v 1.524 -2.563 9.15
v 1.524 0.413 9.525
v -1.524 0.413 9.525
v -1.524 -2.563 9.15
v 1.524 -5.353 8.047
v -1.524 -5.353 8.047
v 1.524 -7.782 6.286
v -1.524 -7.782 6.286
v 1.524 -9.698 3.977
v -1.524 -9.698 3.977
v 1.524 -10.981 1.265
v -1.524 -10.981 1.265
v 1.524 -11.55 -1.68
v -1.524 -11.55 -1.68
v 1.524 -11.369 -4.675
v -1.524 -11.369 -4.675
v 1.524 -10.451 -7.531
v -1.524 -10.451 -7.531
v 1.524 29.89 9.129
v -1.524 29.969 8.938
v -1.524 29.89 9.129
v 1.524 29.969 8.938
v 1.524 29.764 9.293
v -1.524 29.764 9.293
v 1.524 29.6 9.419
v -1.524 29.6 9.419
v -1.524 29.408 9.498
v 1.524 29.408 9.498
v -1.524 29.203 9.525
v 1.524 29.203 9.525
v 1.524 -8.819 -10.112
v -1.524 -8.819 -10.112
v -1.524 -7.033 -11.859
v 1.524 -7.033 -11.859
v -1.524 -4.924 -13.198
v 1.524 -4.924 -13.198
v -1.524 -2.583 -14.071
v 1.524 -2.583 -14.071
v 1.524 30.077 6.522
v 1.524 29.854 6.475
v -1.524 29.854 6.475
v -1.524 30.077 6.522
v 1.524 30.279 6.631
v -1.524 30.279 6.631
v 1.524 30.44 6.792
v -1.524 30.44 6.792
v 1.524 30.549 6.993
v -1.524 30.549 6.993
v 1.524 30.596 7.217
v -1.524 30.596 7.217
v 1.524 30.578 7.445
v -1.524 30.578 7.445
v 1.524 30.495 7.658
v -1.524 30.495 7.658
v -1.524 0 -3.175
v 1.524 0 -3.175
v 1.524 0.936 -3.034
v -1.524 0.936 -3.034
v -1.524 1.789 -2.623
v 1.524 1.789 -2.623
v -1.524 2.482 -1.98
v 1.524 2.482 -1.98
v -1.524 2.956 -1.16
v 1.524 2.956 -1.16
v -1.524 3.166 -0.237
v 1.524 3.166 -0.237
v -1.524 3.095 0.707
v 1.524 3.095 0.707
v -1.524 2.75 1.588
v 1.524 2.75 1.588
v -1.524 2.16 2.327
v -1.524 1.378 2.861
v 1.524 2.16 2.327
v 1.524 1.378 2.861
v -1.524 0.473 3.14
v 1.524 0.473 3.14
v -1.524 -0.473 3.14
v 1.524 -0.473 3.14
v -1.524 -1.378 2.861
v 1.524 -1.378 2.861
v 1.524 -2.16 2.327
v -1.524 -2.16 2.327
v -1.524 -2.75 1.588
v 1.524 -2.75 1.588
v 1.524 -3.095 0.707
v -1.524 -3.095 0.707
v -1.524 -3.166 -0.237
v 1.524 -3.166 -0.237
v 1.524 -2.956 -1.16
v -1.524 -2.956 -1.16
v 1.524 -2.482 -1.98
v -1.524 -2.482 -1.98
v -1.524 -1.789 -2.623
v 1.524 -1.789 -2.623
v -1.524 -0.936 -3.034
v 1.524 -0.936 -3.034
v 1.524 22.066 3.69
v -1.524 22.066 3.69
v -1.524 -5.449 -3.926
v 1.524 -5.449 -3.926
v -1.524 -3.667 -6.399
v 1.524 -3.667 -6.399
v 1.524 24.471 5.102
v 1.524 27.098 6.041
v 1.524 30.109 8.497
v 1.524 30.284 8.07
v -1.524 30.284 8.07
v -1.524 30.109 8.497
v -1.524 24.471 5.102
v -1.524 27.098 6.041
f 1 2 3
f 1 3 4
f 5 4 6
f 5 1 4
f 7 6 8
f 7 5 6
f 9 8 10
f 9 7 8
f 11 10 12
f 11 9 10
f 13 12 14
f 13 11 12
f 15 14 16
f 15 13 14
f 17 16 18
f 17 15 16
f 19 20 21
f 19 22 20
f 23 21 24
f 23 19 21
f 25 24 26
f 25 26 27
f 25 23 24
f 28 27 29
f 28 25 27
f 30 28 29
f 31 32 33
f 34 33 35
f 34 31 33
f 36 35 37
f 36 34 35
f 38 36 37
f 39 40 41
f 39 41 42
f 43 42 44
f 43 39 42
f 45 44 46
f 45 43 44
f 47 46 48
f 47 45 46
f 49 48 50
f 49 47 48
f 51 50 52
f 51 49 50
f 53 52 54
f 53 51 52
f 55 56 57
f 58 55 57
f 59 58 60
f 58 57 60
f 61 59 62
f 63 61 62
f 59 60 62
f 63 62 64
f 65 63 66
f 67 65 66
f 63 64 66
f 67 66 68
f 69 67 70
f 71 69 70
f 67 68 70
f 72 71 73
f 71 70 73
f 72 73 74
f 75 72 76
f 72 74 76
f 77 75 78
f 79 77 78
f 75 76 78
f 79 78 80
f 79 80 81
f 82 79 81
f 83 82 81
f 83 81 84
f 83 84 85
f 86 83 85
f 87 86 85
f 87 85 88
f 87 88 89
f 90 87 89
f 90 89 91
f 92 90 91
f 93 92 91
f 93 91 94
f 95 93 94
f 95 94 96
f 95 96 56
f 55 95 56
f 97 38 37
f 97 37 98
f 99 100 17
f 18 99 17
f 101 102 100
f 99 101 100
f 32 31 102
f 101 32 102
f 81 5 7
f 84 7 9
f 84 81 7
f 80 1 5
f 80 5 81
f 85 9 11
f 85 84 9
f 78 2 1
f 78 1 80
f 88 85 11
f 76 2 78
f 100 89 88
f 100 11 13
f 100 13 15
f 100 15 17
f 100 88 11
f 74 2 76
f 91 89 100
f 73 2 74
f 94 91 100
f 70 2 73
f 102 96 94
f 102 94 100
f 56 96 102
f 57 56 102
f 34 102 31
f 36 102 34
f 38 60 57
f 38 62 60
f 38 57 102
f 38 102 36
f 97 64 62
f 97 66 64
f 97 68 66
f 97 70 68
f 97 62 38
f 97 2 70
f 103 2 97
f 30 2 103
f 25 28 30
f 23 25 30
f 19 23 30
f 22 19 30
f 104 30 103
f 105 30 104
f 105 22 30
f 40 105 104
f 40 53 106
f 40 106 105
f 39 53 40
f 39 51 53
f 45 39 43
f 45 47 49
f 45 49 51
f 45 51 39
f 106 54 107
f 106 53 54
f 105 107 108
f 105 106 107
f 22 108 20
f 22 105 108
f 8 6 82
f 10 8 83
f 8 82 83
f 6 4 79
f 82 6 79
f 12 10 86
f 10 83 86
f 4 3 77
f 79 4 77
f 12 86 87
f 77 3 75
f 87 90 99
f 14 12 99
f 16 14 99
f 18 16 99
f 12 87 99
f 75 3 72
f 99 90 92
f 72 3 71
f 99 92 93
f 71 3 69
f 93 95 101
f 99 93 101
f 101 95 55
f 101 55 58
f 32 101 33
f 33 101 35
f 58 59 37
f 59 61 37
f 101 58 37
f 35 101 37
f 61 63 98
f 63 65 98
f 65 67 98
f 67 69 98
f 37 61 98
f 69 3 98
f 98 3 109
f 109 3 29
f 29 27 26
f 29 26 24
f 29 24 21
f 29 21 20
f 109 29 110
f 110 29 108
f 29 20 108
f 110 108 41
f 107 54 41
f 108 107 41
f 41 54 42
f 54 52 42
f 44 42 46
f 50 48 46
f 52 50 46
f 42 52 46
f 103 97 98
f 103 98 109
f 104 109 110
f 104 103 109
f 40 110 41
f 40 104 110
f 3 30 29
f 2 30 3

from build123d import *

# Parameters (mm, degrees)
BOSS_EXTRUDE1_DEPTH = 1.524
SKETCH2_R           = 3.175
CUT_EXTRUDE1_DEPTH  = 4.048
CUT_EXTRUDE2_DEPTH  = 4.048


with BuildPart() as part:
    # Sketch1 → Boss-Extrude1 (new body, symmetric)
    with BuildSketch(Plane(origin=(0, 0, 0), x_dir=(0, 0, -1), z_dir=(1, 0, 0))):
        with BuildLine():
            Line((-9.525, 29.203153615), (-9.525, 0.413383537))
            ThreePointArc((-9.525, 0.413383537), (0.953114694, -11.479629163), (14.071488999, -2.58339995))
            Line((14.071488999, -2.58339995), (-3.690440969, 22.065775388))
            ThreePointArc((-3.690440969, 22.065775388), (-5.633424794, 25.762785311), (-6.474725684, 29.85366313))
            ThreePointArc((-6.474725684, 29.85366313), (-6.888835567, 30.502157859), (-7.658237218, 30.494842983))
            ThreePointArc((-7.658237218, 30.494842983), (-8.281558069, 30.191808808), (-8.938016281, 29.969499991))
            ThreePointArc((-8.938016281, 29.969499991), (-9.361392761, 29.685812049), (-9.525, 29.203153615))
        make_face()
    extrude(amount=BOSS_EXTRUDE1_DEPTH, both=True)

    # Sketch2 → Cut-Extrude1 (cut, through all)
    with BuildSketch(Plane(origin=(1.524, 0, 0), x_dir=(0, 0, -1), z_dir=(1, 0, 0))):
        Circle(SKETCH2_R)
    extrude(amount=-CUT_EXTRUDE1_DEPTH, mode=Mode.SUBTRACT)

    # Sketch3 → Cut-Extrude2 (cut, through all)
    with BuildSketch(Plane(origin=(1.524, 0, 0), x_dir=(0, 0, -1), z_dir=(1, 0, 0))):
        with BuildLine():
            Line((3.926398482, -5.448872099), (7.531186188, -10.451427812))
            ThreePointArc((7.531186188, -10.451427812), (8.873585882, -9.717582903), (10.111597952, -8.818755111))
            Line((10.111597952, -8.818755111), (6.399264057, -3.66695183))
            Line((6.399264057, -3.66695183), (3.926398482, -5.448872099))
        make_face()
    extrude(amount=-CUT_EXTRUDE2_DEPTH, mode=Mode.SUBTRACT)


solid = part.part
